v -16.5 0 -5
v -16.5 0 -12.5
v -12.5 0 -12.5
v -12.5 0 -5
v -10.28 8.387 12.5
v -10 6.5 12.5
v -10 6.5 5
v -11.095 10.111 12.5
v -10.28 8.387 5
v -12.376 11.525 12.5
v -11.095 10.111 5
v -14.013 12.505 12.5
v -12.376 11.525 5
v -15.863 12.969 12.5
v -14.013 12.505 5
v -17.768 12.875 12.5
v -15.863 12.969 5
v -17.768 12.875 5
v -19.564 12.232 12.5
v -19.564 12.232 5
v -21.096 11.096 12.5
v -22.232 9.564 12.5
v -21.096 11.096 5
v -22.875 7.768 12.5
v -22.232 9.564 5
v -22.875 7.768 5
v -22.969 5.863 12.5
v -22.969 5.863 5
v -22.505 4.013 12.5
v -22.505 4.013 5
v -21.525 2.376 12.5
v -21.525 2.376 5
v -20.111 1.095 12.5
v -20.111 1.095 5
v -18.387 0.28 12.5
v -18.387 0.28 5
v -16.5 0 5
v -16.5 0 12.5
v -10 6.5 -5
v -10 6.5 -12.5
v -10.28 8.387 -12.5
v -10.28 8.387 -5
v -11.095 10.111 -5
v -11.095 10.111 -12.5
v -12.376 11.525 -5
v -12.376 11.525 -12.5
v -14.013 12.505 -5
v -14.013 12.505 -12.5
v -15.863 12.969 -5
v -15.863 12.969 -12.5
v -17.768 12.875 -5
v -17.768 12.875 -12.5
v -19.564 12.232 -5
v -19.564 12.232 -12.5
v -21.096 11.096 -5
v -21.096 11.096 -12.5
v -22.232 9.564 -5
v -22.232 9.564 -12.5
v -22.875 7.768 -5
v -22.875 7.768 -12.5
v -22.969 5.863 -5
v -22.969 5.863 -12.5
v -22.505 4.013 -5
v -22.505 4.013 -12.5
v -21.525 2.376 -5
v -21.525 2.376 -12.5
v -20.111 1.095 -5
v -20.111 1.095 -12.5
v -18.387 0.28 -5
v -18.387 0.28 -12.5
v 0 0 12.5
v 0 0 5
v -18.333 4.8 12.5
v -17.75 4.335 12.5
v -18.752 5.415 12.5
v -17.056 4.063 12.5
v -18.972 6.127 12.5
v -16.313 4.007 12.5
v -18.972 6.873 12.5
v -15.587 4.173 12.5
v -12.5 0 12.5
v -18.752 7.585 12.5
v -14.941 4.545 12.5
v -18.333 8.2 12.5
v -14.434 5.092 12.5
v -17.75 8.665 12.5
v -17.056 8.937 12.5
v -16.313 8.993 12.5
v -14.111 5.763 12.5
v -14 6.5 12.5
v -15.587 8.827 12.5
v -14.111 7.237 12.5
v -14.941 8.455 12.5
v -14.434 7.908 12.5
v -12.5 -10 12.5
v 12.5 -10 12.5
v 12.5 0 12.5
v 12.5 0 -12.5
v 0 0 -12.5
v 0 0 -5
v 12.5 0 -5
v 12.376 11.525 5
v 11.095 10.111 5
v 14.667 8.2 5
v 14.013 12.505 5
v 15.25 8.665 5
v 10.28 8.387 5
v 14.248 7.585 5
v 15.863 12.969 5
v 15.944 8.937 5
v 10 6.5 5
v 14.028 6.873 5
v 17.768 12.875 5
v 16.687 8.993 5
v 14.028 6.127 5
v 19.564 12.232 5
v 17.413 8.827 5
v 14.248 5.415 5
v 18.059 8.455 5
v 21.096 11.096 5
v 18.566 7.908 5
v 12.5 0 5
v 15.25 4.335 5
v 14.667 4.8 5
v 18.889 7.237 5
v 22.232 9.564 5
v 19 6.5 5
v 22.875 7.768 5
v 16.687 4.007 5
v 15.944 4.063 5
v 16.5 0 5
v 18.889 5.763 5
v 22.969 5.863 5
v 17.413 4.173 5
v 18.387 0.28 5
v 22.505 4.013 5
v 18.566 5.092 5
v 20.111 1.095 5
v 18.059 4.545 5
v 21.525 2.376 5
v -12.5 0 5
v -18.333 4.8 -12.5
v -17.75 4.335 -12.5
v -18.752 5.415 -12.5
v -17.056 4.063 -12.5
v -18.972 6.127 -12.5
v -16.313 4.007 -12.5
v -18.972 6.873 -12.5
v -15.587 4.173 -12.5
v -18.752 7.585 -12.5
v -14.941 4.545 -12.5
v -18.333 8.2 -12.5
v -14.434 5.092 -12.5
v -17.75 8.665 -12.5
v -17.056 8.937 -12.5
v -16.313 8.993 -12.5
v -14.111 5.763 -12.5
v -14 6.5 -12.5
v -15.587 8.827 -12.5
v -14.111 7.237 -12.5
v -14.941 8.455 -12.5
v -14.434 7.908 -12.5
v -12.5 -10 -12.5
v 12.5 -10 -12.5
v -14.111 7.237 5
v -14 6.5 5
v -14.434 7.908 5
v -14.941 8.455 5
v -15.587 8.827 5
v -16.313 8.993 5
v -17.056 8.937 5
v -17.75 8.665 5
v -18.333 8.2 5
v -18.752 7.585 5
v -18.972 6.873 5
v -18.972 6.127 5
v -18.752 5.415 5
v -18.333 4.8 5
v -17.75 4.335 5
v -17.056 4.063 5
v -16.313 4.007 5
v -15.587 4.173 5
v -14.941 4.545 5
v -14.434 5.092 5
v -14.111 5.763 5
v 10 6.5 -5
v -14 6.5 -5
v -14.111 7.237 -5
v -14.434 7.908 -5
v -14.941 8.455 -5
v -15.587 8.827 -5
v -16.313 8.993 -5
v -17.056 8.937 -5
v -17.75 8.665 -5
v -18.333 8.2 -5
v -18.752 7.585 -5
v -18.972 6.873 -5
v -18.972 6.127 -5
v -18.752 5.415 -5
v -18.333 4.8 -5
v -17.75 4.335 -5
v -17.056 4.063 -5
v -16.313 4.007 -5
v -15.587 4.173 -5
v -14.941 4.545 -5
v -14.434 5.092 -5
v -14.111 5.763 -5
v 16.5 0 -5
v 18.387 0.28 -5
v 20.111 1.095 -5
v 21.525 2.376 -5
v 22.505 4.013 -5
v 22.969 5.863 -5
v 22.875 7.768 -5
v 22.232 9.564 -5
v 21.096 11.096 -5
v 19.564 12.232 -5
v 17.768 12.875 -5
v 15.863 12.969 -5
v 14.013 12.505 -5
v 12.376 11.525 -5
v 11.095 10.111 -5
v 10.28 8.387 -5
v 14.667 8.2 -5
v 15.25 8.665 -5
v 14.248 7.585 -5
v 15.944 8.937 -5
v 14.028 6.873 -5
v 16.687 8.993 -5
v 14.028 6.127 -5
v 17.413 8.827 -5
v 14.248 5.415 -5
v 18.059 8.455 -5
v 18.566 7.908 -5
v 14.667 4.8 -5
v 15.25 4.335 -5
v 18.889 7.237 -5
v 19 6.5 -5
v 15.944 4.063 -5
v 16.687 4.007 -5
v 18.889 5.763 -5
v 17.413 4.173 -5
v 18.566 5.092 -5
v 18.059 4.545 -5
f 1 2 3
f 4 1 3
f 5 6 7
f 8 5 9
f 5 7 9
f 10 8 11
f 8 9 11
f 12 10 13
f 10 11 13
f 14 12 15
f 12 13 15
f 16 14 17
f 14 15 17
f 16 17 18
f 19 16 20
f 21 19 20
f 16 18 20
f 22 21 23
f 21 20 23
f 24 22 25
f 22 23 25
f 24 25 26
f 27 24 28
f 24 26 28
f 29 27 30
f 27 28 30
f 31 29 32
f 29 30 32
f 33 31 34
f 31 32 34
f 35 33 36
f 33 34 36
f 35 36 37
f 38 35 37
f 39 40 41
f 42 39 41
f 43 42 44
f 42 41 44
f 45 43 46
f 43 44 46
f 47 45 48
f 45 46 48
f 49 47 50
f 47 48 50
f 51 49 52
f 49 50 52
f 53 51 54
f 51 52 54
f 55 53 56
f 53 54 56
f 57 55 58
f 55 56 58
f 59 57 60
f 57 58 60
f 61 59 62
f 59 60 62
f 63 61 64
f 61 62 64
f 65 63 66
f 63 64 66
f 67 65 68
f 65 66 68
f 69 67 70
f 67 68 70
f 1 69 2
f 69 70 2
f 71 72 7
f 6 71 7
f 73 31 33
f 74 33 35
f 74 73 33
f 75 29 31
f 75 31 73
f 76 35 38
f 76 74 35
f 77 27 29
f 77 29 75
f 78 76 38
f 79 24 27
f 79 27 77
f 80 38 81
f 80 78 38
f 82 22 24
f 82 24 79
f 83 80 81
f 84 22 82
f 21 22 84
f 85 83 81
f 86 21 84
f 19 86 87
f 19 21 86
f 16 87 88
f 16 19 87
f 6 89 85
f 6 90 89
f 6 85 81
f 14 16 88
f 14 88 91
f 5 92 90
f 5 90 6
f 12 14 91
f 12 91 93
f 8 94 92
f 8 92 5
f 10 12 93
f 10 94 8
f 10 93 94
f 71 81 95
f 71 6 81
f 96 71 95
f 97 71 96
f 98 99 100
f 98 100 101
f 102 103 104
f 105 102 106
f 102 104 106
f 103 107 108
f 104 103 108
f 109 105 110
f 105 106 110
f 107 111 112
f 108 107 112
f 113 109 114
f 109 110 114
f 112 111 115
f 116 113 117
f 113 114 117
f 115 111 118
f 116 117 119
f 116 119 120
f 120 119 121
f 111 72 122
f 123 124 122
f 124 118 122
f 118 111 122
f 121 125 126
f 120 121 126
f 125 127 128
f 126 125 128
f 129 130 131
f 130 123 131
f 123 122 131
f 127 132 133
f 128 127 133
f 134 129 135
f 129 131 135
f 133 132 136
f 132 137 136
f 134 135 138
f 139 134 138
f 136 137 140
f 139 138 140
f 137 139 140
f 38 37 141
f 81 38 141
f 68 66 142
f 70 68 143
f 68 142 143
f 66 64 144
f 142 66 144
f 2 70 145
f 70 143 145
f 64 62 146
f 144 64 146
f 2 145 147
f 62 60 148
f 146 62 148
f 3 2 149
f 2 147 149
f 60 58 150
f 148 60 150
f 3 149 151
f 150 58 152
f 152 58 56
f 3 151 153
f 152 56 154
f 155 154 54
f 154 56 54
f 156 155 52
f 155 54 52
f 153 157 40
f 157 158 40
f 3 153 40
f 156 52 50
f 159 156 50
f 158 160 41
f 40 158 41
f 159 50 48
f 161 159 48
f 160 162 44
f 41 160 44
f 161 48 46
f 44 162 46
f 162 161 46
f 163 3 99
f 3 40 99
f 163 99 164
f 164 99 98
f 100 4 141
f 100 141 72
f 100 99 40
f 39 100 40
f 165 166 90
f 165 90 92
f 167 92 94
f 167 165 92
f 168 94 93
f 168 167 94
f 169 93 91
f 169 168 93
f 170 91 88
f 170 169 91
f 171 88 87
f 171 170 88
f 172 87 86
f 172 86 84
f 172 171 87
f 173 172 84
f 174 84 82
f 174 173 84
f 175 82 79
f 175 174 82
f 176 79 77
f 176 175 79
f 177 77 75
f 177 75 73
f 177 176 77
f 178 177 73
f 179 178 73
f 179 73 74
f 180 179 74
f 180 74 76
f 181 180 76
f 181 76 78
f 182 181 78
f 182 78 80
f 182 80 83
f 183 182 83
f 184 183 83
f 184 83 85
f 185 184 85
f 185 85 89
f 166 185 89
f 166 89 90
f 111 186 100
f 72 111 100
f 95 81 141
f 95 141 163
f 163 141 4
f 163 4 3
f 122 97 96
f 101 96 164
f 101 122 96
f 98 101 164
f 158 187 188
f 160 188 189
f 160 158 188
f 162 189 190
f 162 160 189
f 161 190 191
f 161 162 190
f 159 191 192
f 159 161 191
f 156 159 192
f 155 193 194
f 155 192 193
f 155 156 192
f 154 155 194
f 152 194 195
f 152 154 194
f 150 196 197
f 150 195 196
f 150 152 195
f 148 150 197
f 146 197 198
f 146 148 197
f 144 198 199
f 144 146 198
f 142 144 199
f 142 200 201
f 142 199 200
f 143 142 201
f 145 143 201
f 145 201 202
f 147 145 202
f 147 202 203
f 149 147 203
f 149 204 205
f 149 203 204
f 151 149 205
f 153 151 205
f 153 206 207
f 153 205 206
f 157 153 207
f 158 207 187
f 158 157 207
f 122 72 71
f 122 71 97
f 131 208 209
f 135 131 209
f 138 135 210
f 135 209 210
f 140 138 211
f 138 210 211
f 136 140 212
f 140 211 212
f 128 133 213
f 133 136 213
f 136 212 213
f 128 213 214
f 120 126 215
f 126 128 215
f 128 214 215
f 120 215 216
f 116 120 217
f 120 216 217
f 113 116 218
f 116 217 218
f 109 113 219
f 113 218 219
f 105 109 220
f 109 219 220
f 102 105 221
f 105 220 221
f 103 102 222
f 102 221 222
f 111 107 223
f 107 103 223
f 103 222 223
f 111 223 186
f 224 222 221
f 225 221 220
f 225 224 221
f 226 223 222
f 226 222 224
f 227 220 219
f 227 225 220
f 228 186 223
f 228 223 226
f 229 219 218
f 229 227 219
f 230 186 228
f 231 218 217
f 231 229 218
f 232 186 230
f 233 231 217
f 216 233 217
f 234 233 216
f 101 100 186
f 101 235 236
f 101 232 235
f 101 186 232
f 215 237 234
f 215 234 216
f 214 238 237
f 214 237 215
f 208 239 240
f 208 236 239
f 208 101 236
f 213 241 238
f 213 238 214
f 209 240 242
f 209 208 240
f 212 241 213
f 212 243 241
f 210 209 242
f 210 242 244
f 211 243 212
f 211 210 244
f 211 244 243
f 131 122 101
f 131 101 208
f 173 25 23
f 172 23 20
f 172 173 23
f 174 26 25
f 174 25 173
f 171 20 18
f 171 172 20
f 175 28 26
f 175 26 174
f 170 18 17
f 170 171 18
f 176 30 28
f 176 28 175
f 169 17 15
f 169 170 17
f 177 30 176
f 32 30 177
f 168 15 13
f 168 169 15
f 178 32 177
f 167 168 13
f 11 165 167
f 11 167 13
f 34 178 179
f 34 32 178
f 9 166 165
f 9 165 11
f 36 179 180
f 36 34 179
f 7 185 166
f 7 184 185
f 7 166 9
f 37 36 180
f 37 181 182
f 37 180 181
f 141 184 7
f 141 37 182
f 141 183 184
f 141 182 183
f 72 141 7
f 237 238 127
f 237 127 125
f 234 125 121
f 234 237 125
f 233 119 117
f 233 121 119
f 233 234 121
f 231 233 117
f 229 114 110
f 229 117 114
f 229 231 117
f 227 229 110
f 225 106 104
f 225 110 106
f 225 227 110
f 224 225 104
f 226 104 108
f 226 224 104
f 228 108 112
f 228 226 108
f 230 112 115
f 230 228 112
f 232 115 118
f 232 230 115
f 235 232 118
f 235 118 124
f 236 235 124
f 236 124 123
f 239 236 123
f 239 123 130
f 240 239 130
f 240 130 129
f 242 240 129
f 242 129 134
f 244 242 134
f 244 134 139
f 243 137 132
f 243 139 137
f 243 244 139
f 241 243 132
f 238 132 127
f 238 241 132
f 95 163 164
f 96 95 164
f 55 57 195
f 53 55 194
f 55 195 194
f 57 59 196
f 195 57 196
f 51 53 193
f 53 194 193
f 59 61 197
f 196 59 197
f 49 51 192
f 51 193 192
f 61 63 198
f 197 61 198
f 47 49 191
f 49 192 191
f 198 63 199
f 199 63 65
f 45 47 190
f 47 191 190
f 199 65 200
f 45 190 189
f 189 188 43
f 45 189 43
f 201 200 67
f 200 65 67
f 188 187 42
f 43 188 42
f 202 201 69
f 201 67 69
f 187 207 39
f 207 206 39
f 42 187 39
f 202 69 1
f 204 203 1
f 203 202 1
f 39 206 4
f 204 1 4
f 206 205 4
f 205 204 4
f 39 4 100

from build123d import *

# Parameters (mm, degrees)
SKETCH1_W                = 25
SKETCH1_H                = 25
BOSS_EXTRUDE1_DEPTH      = 10
BOSS_EXTRUDE2_DEPTH      = 12.5
BOSS_EXTRUDE2_DEPTH_BACK = 12.5
SKETCH2_R                = 2.5
SKETCH3_W                = 25.519828657
SKETCH3_H                = 10
SKETCH3_W_2              = 24.900390406
SKETCH3_H_2              = 9.385874126
SKETCH3_H_3              = 11.424636542
CUT_EXTRUDE1_DEPTH       = 22.5


with BuildPart() as part:
    # Sketch1 → Boss-Extrude1 (new body)
    with BuildSketch(Plane(origin=(0, 0, 0), x_dir=(1, 0, 0), z_dir=(0, 1, 0))):
        Rectangle(SKETCH1_W, SKETCH1_H)
    extrude(amount=-BOSS_EXTRUDE1_DEPTH)

    # Sketch2 → Boss-Extrude2 (add, two sides: drawn at the far end of the back side and taken through both)
    # profile 1 of 2: a face of its own
    with BuildSketch(Plane.XY.offset(-BOSS_EXTRUDE2_DEPTH_BACK)):
        with BuildLine():
            Line((0, 0), (-10, 6.5))
            ThreePointArc((-10, 6.5), (-21.096194078, 11.096194078), (-16.5, 0))
            Line((-16.5, 0), (0, 0))
        make_face()
        with Locations((-16.5, 6.5)):
            Circle(SKETCH2_R, mode=Mode.SUBTRACT)
    # profile 2 of 2: a face of its own
    with BuildSketch(Plane.XY.offset(-BOSS_EXTRUDE2_DEPTH_BACK)):
        with BuildLine():
            Line((10, 6.5), (0, 0))
            Line((0, 0), (16.5, 0))
            ThreePointArc((16.5, 0), (21.096194078, 11.096194078), (10, 6.5))
        make_face()
        with Locations((16.5, 6.5)):
            Circle(SKETCH2_R, mode=Mode.SUBTRACT)
    extrude(amount=BOSS_EXTRUDE2_DEPTH + BOSS_EXTRUDE2_DEPTH_BACK)

    # Sketch3 → Cut-Extrude1 (cut)
    with BuildSketch(Plane(origin=(0, 0, 0), x_dir=(1, 0, 0), z_dir=(0, 1, 0))):
        with Locations((-12.759914329, 0)):
            Rectangle(SKETCH3_W, SKETCH3_H)
        with Locations((12.450195203, -9.692937063)):
            Rectangle(SKETCH3_W_2, SKETCH3_H_2)
        with Locations((12.450195203, 10.712318271)):
            Rectangle(SKETCH3_W_2, SKETCH3_H_3)
    extrude(amount=CUT_EXTRUDE1_DEPTH, mode=Mode.SUBTRACT)


solid = part.part
